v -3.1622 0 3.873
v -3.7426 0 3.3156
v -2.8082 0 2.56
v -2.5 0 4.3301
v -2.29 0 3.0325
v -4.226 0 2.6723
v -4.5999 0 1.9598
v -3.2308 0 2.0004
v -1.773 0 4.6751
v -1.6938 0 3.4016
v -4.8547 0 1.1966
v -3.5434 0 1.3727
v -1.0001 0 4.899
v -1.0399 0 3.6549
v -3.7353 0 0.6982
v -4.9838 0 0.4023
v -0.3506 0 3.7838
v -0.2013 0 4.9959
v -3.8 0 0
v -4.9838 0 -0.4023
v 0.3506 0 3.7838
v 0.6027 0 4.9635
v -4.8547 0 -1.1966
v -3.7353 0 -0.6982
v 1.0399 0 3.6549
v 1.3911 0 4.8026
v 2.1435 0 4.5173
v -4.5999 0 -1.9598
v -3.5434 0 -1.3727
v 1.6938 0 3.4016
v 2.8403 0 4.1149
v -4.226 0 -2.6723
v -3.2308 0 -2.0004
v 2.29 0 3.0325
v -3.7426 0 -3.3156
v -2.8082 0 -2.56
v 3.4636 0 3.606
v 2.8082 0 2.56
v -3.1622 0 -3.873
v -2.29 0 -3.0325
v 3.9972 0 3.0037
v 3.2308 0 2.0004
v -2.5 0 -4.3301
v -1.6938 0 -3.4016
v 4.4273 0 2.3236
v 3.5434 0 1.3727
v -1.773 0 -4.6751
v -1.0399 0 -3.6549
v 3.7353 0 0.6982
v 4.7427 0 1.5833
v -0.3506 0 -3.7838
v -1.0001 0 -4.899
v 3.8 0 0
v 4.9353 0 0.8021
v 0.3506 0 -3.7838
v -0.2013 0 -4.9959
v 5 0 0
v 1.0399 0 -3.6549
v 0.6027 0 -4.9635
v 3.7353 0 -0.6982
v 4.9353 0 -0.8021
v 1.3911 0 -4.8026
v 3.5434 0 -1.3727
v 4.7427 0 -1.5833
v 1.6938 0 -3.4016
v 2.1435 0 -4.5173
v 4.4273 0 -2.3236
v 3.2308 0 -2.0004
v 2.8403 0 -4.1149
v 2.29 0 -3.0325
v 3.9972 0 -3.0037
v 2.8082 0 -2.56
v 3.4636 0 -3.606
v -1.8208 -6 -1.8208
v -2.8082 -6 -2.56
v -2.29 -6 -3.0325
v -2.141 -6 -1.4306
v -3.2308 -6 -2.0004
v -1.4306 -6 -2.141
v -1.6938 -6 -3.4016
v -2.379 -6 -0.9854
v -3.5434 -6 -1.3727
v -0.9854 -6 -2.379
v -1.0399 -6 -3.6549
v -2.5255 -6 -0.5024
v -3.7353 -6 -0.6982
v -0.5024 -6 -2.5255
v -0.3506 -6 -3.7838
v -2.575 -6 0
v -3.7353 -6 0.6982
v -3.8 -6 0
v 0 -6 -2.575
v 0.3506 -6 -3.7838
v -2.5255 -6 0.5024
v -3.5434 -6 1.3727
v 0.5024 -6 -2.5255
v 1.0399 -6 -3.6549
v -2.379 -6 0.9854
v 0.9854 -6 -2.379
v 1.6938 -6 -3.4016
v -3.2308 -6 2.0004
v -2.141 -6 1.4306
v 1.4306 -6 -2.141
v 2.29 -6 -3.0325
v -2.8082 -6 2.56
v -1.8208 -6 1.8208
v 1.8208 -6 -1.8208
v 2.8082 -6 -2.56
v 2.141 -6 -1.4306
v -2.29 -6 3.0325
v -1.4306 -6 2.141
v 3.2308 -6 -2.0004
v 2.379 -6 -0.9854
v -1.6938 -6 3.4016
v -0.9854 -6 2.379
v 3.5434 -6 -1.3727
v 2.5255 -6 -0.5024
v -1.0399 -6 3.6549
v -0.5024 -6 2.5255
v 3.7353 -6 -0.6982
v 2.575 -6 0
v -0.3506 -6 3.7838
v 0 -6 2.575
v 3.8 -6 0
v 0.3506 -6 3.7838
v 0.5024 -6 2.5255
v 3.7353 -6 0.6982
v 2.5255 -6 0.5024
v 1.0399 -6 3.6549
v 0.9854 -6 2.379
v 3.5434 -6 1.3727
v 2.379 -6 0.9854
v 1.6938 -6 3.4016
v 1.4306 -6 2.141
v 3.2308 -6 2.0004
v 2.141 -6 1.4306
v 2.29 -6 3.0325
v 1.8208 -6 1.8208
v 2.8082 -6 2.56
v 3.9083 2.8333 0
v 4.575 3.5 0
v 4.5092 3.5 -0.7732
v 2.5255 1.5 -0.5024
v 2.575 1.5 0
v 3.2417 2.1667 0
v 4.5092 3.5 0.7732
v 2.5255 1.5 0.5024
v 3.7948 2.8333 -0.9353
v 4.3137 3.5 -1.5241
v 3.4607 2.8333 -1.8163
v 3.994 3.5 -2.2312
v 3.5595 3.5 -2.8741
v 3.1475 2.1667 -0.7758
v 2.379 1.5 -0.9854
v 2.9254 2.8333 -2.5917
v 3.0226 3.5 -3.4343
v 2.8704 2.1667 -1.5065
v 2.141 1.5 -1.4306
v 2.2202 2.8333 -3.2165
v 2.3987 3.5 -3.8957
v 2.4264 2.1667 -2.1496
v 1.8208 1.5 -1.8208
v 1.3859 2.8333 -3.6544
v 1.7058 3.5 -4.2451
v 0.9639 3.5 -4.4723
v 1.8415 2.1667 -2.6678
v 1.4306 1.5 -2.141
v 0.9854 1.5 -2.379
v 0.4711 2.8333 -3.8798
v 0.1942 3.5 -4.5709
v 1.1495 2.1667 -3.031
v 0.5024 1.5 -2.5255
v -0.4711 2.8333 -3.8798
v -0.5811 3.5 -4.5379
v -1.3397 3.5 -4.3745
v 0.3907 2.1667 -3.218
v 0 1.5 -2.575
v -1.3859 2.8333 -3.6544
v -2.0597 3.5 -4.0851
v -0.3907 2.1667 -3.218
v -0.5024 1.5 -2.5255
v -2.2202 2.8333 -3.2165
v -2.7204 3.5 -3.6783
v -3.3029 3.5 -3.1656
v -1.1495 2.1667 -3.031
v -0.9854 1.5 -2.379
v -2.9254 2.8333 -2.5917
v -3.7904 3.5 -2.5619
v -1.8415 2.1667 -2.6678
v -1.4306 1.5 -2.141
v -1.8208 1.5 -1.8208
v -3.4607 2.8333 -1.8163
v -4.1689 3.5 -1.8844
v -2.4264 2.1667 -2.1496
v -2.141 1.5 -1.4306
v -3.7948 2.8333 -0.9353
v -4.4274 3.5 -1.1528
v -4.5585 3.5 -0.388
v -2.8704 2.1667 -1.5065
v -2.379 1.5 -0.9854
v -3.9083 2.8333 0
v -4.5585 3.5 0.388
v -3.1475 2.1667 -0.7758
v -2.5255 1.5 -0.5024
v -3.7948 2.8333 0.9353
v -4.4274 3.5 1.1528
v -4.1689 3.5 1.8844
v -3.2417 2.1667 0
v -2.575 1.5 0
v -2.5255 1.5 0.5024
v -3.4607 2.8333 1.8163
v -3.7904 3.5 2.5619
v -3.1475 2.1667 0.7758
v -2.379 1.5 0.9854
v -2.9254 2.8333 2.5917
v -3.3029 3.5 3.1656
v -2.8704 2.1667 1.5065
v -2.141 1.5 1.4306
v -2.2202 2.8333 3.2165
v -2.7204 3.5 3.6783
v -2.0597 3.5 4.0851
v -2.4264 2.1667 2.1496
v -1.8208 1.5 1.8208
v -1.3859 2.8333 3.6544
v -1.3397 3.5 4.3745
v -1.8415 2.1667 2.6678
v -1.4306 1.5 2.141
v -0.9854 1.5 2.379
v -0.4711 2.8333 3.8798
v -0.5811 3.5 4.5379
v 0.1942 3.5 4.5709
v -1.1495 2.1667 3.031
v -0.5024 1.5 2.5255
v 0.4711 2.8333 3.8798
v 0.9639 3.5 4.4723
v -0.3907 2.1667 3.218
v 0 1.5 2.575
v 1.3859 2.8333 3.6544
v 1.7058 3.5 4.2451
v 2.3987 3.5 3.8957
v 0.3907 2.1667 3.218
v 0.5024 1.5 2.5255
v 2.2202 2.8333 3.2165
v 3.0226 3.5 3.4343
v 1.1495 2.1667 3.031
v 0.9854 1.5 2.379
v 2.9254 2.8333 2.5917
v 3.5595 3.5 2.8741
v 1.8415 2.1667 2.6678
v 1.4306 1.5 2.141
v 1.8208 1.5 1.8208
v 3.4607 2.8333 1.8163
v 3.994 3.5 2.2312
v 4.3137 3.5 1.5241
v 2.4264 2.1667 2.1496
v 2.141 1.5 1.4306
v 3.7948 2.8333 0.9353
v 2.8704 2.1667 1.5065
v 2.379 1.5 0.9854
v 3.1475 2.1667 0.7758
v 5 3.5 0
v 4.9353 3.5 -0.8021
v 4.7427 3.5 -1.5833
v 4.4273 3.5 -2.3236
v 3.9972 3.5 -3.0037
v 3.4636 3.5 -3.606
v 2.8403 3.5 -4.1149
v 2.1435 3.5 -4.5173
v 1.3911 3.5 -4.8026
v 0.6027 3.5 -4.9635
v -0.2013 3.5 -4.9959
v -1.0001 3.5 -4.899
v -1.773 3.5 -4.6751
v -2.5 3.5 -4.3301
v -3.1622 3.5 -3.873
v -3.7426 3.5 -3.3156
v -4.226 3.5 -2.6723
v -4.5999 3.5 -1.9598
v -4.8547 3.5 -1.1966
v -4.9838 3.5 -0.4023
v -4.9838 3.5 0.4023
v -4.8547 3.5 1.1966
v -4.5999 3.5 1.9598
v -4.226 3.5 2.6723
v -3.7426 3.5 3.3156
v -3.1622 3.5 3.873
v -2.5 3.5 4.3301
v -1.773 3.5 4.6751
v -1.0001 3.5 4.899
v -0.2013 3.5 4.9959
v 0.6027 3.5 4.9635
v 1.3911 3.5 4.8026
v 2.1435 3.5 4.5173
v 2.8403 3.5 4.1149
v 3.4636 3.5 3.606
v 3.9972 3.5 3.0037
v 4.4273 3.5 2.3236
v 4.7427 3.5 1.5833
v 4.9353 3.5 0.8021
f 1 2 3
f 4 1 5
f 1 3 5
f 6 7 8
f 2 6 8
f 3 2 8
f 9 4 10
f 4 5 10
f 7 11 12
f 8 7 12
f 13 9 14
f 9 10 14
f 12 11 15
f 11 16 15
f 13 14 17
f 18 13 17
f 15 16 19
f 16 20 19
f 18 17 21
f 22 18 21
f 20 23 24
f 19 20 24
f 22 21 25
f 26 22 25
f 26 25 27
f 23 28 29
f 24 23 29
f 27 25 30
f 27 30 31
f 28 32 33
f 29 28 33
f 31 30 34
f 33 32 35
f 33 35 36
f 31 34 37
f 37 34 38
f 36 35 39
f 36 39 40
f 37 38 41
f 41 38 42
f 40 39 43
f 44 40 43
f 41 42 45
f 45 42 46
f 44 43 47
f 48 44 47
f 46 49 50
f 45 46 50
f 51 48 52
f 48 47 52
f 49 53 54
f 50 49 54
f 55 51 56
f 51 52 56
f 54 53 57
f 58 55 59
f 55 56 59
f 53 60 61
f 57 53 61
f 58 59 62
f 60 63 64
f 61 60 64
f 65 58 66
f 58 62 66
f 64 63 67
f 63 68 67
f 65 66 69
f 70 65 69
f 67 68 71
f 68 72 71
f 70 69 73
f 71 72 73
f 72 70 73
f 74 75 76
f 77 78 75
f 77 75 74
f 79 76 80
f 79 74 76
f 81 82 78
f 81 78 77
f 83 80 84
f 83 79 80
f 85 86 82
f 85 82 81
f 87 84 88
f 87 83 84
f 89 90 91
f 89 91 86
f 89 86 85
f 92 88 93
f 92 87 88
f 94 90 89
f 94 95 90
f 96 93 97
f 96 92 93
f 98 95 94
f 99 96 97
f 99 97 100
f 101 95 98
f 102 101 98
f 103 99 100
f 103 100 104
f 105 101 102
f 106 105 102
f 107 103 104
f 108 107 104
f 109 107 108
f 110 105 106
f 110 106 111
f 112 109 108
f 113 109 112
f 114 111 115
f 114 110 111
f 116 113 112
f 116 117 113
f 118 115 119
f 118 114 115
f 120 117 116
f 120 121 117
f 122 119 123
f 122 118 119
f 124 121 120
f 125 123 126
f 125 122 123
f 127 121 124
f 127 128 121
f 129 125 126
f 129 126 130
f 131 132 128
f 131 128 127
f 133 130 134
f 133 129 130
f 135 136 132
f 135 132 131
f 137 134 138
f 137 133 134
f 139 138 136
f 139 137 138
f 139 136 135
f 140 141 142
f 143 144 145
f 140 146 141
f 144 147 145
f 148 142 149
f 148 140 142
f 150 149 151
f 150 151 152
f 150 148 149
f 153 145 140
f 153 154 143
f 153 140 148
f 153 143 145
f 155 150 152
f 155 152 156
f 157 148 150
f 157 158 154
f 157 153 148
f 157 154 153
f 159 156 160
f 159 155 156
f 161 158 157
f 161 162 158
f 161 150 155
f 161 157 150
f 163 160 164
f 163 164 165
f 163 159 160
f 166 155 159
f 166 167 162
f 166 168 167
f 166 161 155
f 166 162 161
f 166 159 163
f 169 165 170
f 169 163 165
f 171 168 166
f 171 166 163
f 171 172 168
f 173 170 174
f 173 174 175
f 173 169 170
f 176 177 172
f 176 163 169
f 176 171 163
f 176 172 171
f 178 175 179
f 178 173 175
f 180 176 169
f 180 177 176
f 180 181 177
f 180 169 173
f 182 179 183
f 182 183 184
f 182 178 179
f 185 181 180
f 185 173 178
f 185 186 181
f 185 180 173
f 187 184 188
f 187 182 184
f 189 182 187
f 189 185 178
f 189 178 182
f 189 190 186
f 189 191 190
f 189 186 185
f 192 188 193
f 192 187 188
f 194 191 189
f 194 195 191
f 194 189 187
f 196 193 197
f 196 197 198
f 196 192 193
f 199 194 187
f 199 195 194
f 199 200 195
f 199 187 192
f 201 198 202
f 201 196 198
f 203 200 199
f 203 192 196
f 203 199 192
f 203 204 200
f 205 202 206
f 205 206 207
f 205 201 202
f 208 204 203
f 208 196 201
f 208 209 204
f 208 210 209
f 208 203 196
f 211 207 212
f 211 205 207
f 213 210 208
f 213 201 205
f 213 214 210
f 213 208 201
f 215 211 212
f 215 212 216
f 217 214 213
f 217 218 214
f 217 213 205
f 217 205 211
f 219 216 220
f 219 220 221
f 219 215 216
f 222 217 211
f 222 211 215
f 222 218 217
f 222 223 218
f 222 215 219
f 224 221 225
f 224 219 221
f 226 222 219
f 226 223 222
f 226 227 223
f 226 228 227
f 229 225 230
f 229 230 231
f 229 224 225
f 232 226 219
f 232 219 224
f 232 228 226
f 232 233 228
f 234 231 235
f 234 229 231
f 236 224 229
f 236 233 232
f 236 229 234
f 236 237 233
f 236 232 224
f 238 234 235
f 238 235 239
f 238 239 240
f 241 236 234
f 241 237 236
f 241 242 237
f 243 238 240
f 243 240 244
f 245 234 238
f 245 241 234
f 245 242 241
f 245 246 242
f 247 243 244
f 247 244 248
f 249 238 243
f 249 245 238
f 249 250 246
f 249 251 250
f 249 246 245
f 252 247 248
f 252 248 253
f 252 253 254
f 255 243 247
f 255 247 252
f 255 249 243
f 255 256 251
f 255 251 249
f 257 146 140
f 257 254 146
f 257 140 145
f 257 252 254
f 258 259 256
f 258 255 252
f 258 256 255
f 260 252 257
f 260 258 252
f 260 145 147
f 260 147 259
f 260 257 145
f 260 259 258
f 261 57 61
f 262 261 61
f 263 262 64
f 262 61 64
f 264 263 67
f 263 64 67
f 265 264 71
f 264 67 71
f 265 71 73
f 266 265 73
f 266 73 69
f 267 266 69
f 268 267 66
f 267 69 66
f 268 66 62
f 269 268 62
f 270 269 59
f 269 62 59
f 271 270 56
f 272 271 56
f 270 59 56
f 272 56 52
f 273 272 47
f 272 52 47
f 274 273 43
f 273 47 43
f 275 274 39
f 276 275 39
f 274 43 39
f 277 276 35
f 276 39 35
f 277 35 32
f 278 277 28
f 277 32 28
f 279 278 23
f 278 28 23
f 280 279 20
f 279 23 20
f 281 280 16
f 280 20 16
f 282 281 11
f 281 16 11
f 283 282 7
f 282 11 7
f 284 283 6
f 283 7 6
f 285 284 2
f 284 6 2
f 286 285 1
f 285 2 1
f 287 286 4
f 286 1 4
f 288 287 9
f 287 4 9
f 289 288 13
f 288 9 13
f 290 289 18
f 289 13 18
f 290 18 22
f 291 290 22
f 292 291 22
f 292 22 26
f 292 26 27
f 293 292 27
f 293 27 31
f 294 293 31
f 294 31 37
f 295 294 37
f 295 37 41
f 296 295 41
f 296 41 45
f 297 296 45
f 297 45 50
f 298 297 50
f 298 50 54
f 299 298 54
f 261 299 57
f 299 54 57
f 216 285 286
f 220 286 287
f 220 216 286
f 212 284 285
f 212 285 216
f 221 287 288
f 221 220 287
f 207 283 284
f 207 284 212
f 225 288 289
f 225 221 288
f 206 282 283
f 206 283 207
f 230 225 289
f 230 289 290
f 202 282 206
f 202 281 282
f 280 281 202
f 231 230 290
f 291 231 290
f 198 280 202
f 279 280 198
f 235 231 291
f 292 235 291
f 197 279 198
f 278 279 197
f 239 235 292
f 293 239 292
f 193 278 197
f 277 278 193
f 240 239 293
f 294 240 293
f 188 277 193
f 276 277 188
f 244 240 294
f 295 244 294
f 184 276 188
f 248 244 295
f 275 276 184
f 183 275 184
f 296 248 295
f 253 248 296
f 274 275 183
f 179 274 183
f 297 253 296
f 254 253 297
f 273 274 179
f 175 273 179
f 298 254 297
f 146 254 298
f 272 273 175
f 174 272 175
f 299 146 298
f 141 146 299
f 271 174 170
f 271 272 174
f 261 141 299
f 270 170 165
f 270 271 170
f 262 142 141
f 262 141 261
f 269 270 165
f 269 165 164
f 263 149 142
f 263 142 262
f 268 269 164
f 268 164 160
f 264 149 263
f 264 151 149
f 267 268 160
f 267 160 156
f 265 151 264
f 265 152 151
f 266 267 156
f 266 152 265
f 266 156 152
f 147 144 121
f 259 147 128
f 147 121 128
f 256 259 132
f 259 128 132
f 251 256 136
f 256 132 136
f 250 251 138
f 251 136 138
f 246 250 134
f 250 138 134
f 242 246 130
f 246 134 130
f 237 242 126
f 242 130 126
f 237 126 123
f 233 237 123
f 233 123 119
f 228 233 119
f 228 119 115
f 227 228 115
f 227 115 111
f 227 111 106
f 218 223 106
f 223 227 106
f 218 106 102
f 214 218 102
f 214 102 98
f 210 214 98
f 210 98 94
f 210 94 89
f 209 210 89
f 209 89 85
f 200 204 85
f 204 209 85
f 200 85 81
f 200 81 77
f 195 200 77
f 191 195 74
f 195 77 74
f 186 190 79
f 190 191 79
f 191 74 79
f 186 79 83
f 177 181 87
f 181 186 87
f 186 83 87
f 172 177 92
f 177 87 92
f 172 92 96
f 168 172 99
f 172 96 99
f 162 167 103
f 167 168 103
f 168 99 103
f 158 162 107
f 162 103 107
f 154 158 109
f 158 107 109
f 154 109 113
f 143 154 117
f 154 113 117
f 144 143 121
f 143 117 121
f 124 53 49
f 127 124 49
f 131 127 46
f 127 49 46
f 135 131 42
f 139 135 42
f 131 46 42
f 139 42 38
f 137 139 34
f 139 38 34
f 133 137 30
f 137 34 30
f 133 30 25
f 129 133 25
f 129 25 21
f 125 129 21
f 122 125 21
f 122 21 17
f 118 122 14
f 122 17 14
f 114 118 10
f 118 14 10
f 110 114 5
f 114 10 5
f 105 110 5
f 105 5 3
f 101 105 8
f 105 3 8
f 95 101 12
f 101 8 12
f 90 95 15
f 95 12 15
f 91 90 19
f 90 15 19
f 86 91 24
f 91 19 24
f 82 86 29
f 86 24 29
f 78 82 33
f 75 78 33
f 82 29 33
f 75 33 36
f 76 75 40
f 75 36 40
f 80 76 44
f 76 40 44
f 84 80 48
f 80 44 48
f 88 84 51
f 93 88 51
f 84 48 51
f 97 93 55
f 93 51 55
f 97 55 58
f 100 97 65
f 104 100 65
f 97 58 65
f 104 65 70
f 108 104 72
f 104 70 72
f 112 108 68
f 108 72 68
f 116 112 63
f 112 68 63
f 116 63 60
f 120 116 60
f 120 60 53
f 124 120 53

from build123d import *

# Parameters (mm, degrees)
SKETCH1_R           = 5
BOSS_EXTRUDE1_DEPTH = 3.5
SKETCH2_R           = 2.575
CUT_EXTRUDE1_DEPTH  = 3.5
CHAMFER1_SIZE       = 2
SKETCH3_R           = 3.8
BOSS_EXTRUDE2_DEPTH = 6
SKETCH4_R           = 2.575
CUT_EXTRUDE2_DEPTH  = 6


with BuildPart() as part:
    # Sketch1 → Boss-Extrude1 (new body)
    with BuildSketch(Plane(origin=(0, 0, 0), x_dir=(1, 0, 0), z_dir=(0, 1, 0))):
        Circle(SKETCH1_R)
    extrude(amount=BOSS_EXTRUDE1_DEPTH)

    # Sketch2 → Cut-Extrude1 (cut)
    with BuildSketch(Plane(origin=(0, 3.5, 0), x_dir=(1, 0, 0), z_dir=(0, 1, 0))):
        Circle(SKETCH2_R)
    extrude(amount=-CUT_EXTRUDE1_DEPTH, mode=Mode.SUBTRACT)

    # Chamfer1
    chamfer1_edges = [part.edges().sort_by_distance(p)[0] for p in [
        (-2.575, 3.5, 0),
    ]]
    chamfer(chamfer1_edges, length=CHAMFER1_SIZE)

    # Sketch3 → Boss-Extrude2 (add)
    with BuildSketch(Plane.XZ):
        Circle(SKETCH3_R)
    extrude(amount=BOSS_EXTRUDE2_DEPTH)

    # Sketch4 → Cut-Extrude2 (cut)
    with BuildSketch(Plane.XZ.offset(6)):
        Circle(SKETCH4_R)
    extrude(amount=-CUT_EXTRUDE2_DEPTH, mode=Mode.SUBTRACT)


solid = part.part
